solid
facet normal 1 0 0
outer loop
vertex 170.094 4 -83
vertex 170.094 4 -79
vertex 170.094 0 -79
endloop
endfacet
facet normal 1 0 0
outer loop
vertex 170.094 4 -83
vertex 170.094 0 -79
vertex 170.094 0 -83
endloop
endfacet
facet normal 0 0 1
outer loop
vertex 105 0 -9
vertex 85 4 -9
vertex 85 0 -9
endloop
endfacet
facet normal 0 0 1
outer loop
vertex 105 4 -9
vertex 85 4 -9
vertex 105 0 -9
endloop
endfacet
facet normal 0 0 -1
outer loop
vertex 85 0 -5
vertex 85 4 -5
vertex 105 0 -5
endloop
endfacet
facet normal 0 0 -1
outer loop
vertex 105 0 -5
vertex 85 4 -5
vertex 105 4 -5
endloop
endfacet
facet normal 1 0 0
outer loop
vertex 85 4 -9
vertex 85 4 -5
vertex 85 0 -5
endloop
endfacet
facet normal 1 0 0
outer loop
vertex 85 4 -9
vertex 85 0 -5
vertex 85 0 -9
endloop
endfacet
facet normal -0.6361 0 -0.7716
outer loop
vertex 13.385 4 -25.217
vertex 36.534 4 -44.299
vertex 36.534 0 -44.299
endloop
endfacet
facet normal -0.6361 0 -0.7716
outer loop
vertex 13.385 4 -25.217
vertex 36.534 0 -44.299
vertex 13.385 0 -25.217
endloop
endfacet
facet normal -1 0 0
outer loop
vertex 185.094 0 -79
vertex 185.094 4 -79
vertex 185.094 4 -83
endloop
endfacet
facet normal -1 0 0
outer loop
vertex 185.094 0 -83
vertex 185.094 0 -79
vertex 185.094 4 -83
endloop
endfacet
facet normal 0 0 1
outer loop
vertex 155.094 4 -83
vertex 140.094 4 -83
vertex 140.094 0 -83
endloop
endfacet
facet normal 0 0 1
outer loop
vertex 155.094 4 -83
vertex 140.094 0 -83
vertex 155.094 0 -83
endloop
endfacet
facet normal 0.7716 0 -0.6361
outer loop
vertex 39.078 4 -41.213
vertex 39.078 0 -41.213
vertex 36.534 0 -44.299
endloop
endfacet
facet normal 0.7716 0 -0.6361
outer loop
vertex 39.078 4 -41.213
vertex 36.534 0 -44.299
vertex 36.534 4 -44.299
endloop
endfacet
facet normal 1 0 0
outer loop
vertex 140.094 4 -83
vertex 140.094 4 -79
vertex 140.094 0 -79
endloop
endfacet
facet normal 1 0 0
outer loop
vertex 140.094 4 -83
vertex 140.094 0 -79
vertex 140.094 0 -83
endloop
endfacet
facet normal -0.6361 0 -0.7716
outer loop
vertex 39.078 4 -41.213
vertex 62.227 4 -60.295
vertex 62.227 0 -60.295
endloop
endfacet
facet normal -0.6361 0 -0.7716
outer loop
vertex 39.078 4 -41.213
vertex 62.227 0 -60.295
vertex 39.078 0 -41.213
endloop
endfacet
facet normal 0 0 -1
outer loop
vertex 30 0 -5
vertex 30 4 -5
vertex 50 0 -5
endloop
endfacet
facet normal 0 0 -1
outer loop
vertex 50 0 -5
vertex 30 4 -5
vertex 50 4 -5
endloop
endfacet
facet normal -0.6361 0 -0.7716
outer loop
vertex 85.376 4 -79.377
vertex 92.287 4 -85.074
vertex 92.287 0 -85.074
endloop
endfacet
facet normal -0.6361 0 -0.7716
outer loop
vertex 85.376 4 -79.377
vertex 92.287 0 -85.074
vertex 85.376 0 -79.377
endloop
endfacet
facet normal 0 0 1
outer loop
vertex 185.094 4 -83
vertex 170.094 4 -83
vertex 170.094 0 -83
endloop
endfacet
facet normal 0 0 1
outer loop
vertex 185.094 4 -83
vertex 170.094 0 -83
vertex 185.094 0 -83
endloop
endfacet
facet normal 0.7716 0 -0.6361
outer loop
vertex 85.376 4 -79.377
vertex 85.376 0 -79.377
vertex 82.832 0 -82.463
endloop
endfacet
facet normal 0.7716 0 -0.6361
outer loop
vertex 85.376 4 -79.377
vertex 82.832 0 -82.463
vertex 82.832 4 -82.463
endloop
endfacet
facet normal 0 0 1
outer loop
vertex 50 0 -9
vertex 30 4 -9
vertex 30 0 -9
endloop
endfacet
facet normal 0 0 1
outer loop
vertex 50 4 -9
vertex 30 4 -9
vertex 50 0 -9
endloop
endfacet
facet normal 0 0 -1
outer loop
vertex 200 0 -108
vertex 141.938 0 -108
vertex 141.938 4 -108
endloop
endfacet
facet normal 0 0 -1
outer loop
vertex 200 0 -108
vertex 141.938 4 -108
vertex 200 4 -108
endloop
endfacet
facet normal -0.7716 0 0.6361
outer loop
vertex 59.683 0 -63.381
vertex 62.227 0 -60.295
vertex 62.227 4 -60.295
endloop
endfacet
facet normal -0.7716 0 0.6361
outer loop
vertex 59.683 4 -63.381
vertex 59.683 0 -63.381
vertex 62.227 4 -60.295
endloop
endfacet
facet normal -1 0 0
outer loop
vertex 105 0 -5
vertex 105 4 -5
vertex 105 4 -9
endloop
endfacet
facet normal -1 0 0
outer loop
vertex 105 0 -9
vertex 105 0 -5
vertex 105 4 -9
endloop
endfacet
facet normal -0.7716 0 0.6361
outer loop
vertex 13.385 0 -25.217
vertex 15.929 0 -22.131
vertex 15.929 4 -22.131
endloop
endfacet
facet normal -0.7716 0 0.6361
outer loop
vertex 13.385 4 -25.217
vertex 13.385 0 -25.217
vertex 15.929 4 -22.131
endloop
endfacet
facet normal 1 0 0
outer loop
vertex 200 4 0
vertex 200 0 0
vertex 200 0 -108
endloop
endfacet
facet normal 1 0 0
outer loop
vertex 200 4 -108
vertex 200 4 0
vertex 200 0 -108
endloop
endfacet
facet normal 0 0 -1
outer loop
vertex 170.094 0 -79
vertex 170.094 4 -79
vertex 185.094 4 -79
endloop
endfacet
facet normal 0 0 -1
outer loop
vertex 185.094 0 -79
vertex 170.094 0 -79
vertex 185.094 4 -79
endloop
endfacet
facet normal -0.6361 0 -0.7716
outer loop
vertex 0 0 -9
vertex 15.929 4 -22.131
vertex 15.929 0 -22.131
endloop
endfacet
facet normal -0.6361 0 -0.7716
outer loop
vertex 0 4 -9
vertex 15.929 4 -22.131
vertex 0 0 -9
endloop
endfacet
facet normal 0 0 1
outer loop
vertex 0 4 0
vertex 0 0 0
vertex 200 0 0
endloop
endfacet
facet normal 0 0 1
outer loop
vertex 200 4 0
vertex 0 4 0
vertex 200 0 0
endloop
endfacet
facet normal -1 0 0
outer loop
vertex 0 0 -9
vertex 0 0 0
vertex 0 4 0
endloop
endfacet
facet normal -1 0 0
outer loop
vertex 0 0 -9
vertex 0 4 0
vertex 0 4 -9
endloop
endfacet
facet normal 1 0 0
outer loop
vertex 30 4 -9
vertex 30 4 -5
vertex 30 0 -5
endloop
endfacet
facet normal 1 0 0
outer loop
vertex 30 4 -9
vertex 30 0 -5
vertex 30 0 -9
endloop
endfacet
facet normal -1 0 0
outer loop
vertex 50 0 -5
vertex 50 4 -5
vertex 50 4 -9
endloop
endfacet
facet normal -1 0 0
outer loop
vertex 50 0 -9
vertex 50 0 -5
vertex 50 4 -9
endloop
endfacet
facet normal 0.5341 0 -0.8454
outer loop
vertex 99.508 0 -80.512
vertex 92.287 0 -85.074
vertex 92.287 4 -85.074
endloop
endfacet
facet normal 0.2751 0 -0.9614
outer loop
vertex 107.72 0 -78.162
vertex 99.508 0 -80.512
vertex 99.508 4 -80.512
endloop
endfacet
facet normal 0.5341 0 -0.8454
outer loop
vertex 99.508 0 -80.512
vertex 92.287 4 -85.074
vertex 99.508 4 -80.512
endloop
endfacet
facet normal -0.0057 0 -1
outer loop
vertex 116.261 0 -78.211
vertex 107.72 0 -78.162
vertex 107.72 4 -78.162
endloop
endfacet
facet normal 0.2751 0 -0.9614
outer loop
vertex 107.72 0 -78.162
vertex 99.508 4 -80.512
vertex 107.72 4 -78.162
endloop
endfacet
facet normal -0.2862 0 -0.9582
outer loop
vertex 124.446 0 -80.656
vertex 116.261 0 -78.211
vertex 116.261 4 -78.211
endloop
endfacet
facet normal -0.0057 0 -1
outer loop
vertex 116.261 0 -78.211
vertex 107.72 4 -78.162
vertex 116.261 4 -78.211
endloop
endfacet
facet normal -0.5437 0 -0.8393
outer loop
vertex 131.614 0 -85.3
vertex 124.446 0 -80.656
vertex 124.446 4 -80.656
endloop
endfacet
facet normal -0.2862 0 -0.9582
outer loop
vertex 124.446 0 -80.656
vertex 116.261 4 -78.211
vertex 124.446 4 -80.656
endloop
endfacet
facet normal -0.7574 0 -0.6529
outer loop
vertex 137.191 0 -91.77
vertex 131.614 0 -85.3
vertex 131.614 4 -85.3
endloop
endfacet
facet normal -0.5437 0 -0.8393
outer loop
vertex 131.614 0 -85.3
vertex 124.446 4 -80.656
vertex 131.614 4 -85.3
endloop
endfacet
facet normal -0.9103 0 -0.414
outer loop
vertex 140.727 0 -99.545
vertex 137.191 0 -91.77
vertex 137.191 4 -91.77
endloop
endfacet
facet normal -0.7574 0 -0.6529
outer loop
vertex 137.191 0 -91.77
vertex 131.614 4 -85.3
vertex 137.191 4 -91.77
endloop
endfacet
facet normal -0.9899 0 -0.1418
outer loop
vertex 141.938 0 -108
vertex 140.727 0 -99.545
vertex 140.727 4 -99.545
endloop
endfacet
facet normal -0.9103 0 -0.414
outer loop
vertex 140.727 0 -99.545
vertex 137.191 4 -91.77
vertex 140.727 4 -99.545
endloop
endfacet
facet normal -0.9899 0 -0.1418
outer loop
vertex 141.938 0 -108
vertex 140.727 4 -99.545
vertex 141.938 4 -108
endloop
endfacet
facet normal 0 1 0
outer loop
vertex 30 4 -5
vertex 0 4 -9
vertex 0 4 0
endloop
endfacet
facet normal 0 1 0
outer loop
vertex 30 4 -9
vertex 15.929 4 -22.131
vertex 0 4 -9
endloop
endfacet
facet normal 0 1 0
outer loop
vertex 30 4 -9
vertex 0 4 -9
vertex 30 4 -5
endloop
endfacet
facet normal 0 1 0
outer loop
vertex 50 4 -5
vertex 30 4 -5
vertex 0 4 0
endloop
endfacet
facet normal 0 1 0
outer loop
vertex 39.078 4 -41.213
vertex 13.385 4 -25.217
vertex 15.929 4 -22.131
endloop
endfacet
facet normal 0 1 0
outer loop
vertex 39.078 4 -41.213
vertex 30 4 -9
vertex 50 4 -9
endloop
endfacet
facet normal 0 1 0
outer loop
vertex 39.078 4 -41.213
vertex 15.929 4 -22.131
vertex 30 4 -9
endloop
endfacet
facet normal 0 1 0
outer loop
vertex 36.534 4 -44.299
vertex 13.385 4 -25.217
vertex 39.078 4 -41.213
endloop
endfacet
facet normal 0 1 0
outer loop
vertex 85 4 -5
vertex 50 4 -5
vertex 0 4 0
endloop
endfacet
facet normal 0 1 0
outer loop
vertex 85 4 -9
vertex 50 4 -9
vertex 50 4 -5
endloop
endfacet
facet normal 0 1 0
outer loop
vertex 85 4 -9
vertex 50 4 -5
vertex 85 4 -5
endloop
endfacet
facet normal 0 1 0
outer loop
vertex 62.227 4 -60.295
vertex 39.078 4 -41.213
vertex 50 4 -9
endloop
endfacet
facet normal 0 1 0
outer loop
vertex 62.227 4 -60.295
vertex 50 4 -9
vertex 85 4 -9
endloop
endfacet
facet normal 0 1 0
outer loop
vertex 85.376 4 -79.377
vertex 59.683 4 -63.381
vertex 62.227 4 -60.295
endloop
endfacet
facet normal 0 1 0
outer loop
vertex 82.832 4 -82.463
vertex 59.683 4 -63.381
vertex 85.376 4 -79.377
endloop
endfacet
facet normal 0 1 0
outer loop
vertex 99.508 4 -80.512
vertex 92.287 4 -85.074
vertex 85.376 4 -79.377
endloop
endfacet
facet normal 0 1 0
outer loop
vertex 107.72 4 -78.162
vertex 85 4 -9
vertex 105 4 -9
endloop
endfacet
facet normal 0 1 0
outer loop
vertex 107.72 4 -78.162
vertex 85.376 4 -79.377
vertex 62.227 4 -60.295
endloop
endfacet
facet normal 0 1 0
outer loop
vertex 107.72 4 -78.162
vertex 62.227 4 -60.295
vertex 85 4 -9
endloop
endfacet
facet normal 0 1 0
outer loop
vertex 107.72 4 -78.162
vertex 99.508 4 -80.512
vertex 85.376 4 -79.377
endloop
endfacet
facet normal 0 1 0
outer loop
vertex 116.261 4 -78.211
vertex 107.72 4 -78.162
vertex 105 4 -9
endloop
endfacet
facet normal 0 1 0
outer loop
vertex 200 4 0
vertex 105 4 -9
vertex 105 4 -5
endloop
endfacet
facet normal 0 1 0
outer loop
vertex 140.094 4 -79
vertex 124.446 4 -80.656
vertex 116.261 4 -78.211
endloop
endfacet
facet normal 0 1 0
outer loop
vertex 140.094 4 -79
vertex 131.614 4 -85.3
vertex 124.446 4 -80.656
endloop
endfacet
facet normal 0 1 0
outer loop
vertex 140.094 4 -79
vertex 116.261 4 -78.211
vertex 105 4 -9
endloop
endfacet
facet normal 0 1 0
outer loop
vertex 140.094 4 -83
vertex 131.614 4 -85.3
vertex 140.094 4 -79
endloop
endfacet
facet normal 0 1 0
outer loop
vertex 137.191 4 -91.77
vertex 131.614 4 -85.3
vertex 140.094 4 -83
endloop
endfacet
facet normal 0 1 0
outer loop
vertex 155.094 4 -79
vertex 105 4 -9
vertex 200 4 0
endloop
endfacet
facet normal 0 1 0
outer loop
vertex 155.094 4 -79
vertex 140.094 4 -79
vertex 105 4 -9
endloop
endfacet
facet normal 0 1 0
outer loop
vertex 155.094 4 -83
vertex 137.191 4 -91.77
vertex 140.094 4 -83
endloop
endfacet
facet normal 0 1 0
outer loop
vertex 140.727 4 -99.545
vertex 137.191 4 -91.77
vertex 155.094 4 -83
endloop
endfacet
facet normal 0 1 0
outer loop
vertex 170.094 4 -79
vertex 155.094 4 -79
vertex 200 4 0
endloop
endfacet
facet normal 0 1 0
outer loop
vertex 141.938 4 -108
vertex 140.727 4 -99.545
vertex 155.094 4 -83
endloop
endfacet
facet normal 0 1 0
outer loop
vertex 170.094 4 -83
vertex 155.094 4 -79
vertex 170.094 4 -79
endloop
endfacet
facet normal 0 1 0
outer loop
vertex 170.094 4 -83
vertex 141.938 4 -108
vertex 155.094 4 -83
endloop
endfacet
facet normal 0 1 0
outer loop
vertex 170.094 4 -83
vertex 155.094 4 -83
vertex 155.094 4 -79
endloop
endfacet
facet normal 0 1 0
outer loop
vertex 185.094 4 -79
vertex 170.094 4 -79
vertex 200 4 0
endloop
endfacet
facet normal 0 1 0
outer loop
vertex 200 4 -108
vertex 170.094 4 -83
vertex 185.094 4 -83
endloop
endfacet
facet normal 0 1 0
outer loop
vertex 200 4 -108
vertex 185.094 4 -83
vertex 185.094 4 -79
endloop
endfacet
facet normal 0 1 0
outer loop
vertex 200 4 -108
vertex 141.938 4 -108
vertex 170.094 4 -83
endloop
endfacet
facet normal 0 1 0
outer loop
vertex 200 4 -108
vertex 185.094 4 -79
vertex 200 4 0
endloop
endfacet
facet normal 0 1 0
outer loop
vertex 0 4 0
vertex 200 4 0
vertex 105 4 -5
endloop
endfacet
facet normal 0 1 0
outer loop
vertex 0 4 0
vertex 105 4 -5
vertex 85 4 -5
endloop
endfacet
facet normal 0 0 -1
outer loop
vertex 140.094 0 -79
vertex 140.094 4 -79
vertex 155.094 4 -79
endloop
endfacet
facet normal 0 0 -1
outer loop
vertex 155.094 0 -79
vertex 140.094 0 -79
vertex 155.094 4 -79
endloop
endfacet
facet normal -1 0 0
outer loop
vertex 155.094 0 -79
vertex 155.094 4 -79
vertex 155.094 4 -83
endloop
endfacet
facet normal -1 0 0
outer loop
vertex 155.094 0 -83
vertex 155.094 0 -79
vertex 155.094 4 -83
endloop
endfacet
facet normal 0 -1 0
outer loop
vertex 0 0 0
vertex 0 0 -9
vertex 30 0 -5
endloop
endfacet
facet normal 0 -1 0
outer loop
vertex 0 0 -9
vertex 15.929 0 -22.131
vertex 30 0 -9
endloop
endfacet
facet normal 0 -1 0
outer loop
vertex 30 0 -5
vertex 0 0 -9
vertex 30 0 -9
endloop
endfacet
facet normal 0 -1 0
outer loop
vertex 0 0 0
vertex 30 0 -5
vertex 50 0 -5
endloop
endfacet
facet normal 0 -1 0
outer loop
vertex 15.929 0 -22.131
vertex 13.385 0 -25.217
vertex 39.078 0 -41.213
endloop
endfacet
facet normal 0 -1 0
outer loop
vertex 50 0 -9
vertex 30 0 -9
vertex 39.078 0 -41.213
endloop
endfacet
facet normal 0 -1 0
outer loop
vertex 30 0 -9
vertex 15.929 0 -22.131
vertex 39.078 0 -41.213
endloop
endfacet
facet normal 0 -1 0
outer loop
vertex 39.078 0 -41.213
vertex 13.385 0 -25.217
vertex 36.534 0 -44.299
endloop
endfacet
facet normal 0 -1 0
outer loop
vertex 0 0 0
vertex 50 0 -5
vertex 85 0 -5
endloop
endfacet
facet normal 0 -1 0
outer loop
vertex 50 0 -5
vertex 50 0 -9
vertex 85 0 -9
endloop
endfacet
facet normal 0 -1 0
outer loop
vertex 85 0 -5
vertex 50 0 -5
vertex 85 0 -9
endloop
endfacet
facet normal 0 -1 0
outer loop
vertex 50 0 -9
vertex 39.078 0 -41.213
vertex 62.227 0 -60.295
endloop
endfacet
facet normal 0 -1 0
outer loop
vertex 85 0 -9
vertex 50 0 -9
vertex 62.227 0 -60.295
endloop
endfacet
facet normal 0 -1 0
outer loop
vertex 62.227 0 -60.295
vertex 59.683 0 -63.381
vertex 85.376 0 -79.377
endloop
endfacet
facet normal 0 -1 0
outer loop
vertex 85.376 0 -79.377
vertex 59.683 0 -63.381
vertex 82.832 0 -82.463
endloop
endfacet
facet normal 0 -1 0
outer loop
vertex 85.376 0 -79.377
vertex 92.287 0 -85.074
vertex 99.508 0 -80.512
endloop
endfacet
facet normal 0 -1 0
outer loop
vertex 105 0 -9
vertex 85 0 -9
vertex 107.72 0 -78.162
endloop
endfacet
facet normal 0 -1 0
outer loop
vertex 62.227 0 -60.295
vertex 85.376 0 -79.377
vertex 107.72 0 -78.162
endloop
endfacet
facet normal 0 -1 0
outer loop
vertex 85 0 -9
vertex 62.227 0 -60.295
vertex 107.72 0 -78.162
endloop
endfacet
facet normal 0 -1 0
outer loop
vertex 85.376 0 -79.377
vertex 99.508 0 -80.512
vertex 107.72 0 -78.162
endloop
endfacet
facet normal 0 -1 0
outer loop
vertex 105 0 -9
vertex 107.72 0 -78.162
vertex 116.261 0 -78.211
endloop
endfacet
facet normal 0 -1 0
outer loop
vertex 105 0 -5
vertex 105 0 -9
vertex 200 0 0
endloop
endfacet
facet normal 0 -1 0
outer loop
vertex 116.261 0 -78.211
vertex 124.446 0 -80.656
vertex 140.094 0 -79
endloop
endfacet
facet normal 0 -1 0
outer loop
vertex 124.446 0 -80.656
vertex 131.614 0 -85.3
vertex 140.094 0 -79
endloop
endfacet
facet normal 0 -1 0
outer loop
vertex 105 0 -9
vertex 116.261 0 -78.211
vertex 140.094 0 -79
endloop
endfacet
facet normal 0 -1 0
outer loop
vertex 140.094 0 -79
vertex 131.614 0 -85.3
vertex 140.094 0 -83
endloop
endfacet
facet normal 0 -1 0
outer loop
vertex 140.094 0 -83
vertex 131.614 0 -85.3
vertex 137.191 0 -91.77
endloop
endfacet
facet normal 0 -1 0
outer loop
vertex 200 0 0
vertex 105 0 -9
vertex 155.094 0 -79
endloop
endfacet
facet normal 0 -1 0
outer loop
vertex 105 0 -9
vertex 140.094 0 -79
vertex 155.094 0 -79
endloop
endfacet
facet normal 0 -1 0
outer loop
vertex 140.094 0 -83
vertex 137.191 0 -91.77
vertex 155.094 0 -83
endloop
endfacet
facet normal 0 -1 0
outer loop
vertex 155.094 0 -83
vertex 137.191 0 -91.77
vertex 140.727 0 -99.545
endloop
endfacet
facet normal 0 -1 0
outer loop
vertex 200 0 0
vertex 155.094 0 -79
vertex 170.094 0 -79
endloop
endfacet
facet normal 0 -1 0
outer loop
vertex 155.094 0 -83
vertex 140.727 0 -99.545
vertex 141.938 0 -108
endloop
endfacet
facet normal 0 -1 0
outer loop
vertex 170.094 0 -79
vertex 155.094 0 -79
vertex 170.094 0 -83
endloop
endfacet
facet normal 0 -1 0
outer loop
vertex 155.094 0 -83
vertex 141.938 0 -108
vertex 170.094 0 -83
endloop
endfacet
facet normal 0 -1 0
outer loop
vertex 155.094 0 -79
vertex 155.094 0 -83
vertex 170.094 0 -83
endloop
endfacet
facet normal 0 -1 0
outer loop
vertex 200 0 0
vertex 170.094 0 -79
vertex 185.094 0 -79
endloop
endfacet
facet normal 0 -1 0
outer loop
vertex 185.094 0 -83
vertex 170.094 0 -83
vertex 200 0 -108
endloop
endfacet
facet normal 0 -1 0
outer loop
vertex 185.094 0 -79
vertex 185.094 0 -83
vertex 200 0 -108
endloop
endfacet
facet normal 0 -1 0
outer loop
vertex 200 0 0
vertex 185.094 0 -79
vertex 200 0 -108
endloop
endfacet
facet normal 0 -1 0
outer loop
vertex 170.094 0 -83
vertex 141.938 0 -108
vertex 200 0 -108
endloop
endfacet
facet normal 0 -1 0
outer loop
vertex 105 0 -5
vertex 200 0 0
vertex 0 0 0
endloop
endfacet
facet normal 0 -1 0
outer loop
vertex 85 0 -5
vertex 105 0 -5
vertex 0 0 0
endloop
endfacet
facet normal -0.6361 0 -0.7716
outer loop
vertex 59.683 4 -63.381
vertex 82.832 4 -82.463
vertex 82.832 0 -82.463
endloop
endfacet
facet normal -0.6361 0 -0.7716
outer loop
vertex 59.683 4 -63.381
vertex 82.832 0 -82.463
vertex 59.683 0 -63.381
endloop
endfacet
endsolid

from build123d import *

# Parameters (mm, degrees)
SKETCH1_W           = 200
SKETCH1_H           = 108
BOSS_EXTRUDE1_DEPTH = 4
CUT_EXTRUDE1_DEPTH  = 228.332355814
SKETCH4_W           = 30
SKETCH4_H           = 4
BOSS_EXTRUDE2_DEPTH = 4
SKETCH5_W           = 15
SKETCH5_H           = 4
SKETCH5_W_2         = 20
CUT_EXTRUDE2_DEPTH  = 228.332355814
SKETCH6_R           = 30.118776273
CUT_EXTRUDE4_DEPTH  = 228.332355814


with BuildPart() as part:
    # Sketch1 → Boss-Extrude1 (new body)
    with BuildSketch(Plane(origin=(0, 0, 0), x_dir=(1, 0, 0), z_dir=(0, 1, 0))):
        with Locations((100, 54)):
            Rectangle(SKETCH1_W, SKETCH1_H)
    extrude(amount=BOSS_EXTRUDE1_DEPTH)

    # Sketch3 → Cut-Extrude1 (cut, through all)
    with BuildSketch(Plane(origin=(0, 4, 0), x_dir=(1, 0, 0), z_dir=(0, 1, 0))):
        Polygon((120.09925776, 108), (0, 9), (0, 108), align=None)
    extrude(amount=-CUT_EXTRUDE1_DEPTH, mode=Mode.SUBTRACT)

    # Sketch4 → Boss-Extrude2 (add)
    with BuildSketch(Plane(origin=(-4.417303696, 0, -5.358736315), x_dir=(-0.7716314833522663, 0, 0.6360698498589453), z_dir=(-0.6360698498589453, 0, -0.7716314833522663))):
        with Locations((-101.3679122, 2)):
            Rectangle(SKETCH4_W, SKETCH4_H)
        with Locations((-41.3679122, 2)):
            Rectangle(SKETCH4_W, SKETCH4_H)
    extrude(amount=BOSS_EXTRUDE2_DEPTH)

    # Sketch5 → Cut-Extrude2 (cut, through all)
    with BuildSketch(Plane(origin=(0, 4, 0), x_dir=(1, 0, 0), z_dir=(0, 1, 0))):
        with Locations((177.594068765, 80.999936793)):
            Rectangle(SKETCH5_W, SKETCH5_H)
        with Locations((147.594068765, 80.999936793)):
            Rectangle(SKETCH5_W, SKETCH5_H)
        with Locations((95, 7)):
            Rectangle(SKETCH5_W_2, SKETCH5_H)
        with Locations((40, 7)):
            Rectangle(SKETCH5_W_2, SKETCH5_H)
    extrude(amount=-CUT_EXTRUDE2_DEPTH, mode=Mode.SUBTRACT)

    # Sketch6 → Cut-Extrude4 (cut, through all)
    with BuildSketch(Plane(origin=(0, 4, 0), x_dir=(1, 0, 0), z_dir=(0, 1, 0))):
        with Locations((111.819464, 108)):
            Circle(SKETCH6_R)
    extrude(amount=-CUT_EXTRUDE4_DEPTH, mode=Mode.SUBTRACT)


solid = part.part
